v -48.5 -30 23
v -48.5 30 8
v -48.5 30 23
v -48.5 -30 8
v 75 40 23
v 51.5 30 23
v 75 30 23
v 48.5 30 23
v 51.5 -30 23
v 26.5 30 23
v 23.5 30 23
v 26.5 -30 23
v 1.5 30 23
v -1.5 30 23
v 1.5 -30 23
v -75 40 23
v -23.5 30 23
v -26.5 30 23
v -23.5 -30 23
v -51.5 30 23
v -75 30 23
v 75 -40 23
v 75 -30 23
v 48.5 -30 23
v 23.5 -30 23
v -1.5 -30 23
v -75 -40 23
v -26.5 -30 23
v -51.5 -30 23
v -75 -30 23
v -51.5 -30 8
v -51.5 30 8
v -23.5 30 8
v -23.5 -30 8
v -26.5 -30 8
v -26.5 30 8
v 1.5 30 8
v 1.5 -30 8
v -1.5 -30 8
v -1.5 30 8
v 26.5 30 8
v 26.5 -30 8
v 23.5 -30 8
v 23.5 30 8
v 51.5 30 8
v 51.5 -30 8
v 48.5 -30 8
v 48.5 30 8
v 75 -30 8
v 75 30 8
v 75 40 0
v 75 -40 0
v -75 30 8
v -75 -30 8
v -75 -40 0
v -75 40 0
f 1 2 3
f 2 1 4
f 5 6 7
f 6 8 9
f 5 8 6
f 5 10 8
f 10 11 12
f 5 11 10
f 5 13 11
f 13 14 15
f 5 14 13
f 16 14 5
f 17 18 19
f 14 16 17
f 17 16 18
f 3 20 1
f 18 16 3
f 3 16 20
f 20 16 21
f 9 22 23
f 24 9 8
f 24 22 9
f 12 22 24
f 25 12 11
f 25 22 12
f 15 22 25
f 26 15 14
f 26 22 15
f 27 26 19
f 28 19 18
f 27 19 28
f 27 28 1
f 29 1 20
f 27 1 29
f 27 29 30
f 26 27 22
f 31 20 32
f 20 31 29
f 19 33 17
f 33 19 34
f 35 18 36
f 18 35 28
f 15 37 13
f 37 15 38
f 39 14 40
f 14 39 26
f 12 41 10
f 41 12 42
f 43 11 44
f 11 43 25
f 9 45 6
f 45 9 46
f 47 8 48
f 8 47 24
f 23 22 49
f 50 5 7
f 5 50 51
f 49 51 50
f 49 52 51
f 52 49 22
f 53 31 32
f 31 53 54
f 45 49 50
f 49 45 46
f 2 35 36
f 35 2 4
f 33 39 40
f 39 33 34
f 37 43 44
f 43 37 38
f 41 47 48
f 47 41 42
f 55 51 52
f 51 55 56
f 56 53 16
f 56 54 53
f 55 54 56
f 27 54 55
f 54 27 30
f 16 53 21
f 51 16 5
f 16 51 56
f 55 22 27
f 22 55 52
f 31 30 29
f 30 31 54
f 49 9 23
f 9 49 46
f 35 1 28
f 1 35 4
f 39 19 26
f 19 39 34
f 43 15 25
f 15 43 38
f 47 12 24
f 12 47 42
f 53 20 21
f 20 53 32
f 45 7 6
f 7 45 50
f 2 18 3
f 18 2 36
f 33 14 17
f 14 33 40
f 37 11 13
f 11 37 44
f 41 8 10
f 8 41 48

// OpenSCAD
$fn = 32;

// ----------------------------------------------------------------------
// Rib frame 150 x 80 x 23
// 5 ribs at 25 mm pitch
// ----------------------------------------------------------------------

// --- parameters (mm) ---
frame = [150, 80, 8];  // base plate size (x, y, z)
rail_w = 10;           // side rail width
ribs = 5;              // number of ribs
rib_t = 3;             // rib thickness
rib_h = 15;            // rib height above the base plate
pitch = 25;            // pitch between rib centres

// --- derived feature positions (mm) ---
span = (ribs - 1) * pitch;          // = 100   distance between the outer ribs
origin_x = -span / 2;               // = -50   X of the first rib
rib_len = frame[1] - 2 * rail_w + 2;  // = 62   rib length, 1 mm into each rail
feature_centers = [
  [origin_x + 0 * pitch, 0],
  [origin_x + 1 * pitch, 0],
  [origin_x + 2 * pitch, 0],
  [origin_x + 3 * pitch, 0],
  [origin_x + 4 * pitch, 0]
];   // rib centre line, drives the rib loop

// base plate, two side rails, then the ribs read straight off feature_centers
union() {
  translate([-frame[0] / 2, -frame[1] / 2, 0]) cube(frame);
  translate([-frame[0] / 2, -frame[1] / 2, 0]) cube([frame[0], rail_w, frame[2] + rib_h]);
  translate([-frame[0] / 2, frame[1] / 2 - rail_w, 0]) cube([frame[0], rail_w, frame[2] + rib_h]);
  for (centre = feature_centers)
    translate([centre[0] - rib_t / 2, centre[1] - rib_len / 2, frame[2] - 1])
      cube([rib_t, rib_len, rib_h + 1]);
}
